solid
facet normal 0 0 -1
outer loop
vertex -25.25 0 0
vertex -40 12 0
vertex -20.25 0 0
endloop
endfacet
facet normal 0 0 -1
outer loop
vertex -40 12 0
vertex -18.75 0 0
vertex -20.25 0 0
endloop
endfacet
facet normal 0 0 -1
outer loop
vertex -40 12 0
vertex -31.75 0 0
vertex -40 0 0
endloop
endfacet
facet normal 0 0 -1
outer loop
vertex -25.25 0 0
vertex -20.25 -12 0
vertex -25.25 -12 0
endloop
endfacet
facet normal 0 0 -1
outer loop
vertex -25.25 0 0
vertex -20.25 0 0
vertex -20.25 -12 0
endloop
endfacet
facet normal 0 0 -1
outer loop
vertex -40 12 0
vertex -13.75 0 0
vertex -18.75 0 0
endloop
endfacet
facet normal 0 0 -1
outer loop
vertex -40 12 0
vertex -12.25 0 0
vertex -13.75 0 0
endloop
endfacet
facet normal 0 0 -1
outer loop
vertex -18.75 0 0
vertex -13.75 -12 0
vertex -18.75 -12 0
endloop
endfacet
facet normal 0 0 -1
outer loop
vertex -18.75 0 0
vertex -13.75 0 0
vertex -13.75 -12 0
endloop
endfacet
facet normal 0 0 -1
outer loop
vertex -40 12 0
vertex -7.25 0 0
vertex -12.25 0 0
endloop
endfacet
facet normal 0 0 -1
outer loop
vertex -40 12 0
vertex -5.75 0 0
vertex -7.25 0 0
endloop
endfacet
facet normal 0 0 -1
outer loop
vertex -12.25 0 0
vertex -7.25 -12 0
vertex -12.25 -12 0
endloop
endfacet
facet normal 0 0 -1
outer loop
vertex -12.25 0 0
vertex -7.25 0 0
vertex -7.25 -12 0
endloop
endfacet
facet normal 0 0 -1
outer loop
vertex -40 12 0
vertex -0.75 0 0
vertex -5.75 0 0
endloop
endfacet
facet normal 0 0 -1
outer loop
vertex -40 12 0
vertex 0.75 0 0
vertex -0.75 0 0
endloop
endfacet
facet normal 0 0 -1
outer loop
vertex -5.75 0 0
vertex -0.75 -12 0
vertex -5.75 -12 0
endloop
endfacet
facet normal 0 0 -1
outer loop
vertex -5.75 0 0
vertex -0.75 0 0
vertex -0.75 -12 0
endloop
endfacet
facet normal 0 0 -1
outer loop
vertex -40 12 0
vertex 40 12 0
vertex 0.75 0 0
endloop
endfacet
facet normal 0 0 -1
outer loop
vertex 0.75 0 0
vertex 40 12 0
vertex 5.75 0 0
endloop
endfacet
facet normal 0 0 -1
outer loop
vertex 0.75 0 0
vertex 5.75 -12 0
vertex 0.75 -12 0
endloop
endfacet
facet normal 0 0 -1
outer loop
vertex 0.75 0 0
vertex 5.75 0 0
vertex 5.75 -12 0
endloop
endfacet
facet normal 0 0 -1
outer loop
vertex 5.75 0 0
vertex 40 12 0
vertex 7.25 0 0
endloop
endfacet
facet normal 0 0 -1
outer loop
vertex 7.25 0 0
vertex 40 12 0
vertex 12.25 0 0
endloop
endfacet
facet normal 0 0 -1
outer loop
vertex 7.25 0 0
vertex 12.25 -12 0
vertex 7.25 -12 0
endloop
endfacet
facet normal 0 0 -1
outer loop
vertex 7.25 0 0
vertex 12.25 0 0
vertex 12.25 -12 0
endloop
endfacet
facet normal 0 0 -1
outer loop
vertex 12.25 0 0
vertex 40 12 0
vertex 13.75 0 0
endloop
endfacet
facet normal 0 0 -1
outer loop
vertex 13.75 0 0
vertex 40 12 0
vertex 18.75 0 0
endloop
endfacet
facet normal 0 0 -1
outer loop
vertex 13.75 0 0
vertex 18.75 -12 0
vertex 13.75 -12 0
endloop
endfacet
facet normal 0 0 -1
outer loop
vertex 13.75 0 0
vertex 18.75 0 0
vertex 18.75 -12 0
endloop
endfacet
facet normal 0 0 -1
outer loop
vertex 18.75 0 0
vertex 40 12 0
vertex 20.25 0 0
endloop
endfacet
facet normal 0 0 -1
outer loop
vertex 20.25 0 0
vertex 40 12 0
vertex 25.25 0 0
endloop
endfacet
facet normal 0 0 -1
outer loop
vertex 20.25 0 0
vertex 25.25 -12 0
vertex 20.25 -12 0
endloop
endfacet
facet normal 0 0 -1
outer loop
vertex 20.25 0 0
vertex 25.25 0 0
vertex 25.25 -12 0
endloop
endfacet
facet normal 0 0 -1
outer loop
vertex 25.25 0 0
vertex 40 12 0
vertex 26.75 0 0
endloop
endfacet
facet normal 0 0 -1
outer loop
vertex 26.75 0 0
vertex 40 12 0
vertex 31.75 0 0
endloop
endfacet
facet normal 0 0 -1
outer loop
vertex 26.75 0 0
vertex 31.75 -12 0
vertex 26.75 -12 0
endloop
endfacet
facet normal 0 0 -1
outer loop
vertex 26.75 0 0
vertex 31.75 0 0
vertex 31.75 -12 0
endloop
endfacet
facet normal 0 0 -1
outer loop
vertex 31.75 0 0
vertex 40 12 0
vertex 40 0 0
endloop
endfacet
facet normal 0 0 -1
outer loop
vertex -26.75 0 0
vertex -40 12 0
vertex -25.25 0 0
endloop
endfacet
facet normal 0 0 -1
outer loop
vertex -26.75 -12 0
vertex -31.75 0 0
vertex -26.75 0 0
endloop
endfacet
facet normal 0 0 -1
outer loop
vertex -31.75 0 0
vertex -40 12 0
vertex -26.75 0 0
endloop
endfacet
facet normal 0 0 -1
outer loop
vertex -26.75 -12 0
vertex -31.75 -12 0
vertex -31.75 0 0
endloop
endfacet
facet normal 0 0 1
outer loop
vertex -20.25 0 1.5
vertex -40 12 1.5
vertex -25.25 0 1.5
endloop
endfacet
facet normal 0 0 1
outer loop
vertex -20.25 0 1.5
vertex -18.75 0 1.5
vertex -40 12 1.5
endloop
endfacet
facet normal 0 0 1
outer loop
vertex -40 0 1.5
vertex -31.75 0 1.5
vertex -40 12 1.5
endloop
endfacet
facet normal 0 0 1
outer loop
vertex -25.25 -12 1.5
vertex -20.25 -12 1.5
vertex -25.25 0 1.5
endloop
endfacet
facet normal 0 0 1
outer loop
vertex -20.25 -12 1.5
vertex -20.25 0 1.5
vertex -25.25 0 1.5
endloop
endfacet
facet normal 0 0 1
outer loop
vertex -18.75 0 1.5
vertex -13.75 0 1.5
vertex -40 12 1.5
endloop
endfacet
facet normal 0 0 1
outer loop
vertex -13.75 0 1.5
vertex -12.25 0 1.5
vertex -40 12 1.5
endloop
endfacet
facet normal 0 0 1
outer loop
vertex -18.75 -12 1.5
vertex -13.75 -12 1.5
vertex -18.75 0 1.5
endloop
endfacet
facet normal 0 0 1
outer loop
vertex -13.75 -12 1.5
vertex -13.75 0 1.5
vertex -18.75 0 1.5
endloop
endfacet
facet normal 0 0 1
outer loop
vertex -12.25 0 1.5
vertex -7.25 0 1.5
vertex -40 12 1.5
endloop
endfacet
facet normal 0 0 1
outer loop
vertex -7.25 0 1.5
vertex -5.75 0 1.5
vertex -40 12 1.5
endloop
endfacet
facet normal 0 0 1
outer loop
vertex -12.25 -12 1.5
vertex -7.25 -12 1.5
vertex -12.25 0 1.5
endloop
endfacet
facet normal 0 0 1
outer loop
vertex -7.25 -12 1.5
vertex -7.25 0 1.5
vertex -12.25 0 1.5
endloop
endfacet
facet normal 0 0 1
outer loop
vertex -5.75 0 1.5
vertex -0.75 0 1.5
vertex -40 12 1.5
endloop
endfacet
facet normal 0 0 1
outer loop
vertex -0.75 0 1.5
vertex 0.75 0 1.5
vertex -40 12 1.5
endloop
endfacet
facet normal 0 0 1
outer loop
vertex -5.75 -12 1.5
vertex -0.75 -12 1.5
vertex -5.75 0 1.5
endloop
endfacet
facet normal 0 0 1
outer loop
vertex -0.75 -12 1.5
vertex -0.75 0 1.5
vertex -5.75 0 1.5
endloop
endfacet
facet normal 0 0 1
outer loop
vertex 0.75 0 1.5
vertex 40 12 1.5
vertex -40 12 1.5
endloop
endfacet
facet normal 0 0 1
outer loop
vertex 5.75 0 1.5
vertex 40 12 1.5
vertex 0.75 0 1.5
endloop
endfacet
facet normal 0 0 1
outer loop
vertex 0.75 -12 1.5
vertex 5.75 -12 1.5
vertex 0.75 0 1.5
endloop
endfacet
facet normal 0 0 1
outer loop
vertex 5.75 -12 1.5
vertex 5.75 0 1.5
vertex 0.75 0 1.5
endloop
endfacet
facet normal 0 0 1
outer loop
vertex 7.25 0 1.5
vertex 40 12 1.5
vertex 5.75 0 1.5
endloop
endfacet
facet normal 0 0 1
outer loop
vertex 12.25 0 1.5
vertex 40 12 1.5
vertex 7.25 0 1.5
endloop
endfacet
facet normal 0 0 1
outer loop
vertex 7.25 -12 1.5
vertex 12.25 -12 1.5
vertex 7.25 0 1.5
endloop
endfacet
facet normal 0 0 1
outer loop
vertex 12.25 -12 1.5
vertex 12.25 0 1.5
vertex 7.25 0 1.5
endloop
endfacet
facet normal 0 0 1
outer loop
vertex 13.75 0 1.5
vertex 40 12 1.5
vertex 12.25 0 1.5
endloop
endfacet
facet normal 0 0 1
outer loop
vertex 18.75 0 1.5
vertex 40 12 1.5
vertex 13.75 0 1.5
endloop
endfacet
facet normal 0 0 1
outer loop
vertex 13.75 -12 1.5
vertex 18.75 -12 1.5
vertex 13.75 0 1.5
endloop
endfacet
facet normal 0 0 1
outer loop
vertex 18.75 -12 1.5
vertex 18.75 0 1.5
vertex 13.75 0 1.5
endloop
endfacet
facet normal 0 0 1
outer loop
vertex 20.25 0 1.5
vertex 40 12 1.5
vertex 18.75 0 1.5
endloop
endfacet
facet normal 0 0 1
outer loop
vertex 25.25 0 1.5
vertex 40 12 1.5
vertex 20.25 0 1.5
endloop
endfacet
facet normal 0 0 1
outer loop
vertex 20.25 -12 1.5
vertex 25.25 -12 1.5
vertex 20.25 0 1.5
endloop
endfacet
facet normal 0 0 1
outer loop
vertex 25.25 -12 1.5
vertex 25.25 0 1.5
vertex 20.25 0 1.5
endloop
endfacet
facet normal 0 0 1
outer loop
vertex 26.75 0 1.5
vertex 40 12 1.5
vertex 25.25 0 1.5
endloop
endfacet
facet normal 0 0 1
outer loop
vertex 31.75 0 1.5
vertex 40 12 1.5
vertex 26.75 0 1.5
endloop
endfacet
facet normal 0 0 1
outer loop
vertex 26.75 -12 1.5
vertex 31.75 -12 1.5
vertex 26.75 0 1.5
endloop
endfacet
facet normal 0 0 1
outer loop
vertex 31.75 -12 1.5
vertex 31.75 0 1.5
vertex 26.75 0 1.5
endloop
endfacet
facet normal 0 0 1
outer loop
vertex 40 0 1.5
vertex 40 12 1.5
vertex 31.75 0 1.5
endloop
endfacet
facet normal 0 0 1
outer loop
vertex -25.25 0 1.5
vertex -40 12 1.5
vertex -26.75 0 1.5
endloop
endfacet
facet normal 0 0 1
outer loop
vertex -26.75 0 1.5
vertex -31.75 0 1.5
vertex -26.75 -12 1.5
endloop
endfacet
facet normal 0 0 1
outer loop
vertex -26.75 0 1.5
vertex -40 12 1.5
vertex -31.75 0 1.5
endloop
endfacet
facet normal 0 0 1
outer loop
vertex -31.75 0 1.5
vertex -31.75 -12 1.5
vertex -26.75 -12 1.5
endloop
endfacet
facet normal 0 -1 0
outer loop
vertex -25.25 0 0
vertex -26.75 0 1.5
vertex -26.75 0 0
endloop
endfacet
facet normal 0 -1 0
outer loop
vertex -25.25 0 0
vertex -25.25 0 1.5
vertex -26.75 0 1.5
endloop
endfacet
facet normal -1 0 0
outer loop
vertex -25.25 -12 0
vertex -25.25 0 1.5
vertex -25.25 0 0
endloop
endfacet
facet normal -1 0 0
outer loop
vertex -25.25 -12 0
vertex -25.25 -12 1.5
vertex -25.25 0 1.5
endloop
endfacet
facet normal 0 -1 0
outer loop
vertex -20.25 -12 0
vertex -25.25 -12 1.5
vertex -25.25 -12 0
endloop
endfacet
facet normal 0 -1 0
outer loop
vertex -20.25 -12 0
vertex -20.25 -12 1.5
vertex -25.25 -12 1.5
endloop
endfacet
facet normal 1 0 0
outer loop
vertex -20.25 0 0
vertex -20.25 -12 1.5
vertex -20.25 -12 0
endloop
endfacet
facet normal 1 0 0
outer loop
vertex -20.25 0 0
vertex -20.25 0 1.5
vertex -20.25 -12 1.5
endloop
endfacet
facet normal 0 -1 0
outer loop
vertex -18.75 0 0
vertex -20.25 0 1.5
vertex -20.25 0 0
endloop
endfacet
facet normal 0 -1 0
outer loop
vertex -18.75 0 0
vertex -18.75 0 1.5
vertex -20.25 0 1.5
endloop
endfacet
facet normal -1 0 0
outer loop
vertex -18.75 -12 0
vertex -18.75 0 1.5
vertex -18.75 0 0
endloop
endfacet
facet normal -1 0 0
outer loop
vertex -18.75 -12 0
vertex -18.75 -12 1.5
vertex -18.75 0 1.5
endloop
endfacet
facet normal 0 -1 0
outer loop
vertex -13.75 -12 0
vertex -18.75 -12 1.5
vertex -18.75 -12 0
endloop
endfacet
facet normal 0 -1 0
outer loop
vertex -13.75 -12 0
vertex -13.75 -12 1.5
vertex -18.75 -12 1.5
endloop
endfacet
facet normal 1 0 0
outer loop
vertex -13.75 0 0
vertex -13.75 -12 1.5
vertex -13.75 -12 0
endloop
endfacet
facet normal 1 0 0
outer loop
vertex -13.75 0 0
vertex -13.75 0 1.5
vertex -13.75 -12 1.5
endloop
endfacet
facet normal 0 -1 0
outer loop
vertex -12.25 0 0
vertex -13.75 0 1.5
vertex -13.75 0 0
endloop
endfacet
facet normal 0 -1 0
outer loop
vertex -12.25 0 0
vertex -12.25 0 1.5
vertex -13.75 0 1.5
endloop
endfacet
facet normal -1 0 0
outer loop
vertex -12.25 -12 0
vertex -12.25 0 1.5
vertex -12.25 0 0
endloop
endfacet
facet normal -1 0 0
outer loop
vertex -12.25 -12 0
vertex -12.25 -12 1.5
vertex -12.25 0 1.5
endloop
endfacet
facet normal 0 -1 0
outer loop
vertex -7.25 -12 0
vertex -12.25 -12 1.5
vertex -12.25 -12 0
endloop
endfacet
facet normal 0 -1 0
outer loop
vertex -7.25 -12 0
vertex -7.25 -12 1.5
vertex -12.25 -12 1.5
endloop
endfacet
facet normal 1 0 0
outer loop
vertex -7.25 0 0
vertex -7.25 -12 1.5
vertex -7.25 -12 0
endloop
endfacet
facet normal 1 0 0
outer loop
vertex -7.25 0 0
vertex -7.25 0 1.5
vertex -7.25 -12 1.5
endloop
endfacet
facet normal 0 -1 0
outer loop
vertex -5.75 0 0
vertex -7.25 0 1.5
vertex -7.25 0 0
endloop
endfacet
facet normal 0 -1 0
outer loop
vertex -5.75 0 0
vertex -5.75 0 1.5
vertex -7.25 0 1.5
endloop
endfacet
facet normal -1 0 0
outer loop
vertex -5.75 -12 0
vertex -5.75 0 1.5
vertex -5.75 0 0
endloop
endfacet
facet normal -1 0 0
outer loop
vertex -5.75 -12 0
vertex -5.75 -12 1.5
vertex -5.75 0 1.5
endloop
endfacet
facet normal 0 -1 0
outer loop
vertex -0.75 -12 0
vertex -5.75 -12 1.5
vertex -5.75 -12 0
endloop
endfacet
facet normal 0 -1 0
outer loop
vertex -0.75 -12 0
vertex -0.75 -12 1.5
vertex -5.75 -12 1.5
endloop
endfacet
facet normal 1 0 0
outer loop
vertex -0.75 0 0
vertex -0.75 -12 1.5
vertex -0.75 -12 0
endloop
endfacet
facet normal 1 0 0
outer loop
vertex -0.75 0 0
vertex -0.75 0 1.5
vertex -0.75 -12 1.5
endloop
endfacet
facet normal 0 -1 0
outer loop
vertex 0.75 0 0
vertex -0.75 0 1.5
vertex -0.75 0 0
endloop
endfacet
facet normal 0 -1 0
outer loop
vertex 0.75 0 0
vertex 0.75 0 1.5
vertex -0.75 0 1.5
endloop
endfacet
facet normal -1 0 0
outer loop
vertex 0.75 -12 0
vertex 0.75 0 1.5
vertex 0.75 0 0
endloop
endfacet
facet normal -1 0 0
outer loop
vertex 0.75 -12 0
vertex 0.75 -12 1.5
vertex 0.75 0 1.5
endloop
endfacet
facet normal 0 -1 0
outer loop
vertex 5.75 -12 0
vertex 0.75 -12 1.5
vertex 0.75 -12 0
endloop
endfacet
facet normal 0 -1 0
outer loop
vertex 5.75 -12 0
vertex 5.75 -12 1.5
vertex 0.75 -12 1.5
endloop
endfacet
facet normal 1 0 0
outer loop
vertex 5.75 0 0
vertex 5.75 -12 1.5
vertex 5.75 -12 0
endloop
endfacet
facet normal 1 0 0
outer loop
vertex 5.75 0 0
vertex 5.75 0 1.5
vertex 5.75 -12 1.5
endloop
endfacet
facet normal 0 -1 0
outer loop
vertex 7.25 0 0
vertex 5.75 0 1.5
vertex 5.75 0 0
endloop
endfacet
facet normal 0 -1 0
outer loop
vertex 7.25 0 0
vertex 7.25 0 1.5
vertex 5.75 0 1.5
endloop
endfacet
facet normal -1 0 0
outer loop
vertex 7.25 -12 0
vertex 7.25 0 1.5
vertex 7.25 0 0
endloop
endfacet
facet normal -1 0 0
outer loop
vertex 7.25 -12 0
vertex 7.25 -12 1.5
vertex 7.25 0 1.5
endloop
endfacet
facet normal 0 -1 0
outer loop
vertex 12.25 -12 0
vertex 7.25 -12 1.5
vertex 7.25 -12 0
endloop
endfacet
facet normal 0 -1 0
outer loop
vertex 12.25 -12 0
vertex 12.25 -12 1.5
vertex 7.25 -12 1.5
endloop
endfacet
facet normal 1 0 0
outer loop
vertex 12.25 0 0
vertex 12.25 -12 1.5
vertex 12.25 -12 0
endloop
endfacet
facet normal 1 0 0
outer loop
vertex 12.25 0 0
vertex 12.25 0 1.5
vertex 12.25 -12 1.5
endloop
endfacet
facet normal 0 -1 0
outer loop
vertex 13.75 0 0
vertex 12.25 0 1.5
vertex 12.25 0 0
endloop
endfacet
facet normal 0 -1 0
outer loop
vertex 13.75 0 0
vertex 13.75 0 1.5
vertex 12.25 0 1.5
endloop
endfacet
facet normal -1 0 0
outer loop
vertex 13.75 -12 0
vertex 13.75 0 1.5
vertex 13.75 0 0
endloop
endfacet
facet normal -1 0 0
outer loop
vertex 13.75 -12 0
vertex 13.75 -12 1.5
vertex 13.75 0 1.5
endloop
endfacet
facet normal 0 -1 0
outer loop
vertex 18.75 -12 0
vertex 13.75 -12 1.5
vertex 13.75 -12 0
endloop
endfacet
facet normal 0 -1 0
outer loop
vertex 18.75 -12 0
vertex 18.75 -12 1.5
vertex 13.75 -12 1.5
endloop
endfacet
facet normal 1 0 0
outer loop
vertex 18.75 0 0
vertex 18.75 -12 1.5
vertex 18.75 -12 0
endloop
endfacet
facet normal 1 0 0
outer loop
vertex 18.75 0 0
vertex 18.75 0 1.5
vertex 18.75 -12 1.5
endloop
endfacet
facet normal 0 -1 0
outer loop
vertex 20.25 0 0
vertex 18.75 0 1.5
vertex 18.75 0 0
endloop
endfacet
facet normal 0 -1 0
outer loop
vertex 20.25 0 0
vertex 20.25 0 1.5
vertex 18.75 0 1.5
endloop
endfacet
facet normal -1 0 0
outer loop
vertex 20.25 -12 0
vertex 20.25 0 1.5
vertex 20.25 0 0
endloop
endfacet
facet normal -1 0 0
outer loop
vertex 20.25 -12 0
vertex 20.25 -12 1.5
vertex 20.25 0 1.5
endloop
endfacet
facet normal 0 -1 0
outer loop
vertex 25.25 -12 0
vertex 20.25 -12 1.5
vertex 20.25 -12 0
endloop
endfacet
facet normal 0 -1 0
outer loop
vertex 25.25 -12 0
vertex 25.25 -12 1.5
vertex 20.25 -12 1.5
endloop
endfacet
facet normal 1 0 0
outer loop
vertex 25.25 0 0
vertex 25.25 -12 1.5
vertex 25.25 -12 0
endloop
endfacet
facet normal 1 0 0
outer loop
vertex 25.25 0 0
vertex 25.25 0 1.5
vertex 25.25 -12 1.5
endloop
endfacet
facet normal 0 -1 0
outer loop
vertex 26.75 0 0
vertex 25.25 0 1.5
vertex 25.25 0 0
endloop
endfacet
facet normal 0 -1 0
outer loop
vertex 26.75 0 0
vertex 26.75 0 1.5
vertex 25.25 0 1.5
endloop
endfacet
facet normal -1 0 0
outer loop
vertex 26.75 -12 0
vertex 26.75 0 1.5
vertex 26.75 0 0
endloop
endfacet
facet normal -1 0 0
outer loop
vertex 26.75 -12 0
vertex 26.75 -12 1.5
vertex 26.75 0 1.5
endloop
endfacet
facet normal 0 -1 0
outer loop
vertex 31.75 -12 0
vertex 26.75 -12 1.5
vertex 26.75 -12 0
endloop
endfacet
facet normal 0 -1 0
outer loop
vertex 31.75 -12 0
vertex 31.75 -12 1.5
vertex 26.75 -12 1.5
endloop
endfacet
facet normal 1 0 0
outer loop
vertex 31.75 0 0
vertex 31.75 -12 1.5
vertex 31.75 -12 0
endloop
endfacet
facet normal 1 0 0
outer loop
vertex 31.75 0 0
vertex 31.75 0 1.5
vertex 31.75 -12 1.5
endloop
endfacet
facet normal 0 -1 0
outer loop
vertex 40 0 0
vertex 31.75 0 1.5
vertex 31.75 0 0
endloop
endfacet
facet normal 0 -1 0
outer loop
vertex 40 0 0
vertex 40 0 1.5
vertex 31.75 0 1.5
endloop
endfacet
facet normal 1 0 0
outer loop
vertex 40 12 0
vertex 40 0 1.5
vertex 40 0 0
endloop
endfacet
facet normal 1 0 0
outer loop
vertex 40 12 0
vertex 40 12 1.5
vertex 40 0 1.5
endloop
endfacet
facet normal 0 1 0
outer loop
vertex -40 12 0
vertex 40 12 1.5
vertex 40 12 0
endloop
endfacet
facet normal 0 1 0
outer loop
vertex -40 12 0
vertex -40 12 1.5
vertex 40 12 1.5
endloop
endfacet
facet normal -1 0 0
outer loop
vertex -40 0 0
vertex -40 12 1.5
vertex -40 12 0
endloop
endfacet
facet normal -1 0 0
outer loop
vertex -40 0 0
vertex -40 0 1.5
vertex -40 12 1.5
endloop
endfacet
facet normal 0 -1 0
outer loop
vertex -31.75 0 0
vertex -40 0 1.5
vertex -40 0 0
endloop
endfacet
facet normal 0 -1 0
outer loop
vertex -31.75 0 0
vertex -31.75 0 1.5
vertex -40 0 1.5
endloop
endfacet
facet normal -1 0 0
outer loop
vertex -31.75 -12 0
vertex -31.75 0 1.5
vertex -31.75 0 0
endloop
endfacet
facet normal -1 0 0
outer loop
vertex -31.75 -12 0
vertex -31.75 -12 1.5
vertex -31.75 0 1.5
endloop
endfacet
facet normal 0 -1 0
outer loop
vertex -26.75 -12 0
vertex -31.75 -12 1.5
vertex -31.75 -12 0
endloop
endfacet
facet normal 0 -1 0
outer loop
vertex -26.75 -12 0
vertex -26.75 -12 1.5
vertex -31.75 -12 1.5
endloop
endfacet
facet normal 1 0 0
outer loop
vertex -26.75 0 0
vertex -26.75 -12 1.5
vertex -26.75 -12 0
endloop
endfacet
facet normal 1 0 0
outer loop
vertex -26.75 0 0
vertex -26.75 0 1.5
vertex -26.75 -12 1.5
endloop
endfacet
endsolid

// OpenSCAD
// 10-well comb for casting agarose gels
// Category: tools. Flat part, prints lying down. The spine is longer than the row of
// teeth so its ends rest on the tray walls (or comb slots); set tooth_len so the tooth
// tips sit 1-2 mm above the tray floor, otherwise wells cast through the gel and
// samples leak out underneath.
// Print: PETG (survives warm agarose better than PLA), 0.15 mm layers, 100 % infill.
// The bed side is smoothest on a smooth PEI sheet - use that side for the well faces.
// Use: let agarose cool to 50-60 C (hand-warm flask) before pouring; hotter agarose
// warps PETG and PLA combs and trays.
// SPDX-License-Identifier: CERN-OHL-P-2.0

/* [Comb] */
// back bar, X x Y [mm]; ends rest on the tray walls
spine = [80, 12];
n_teeth = 10;
// well width
tooth_w = 5.0; // 0.1
// = (height of spine support above tray floor) - 1.5 mm
tooth_len = 12;
// gel between wells
gap = 1.5; // 0.1
// well thickness (comb printed flat)
thickness = 1.5; // 0.1

/* [Hidden] */
eps = 0.01;
span = n_teeth * tooth_w + (n_teeth - 1) * gap;

// parameter checks: stop with a message instead of building a broken part
assert(n_teeth >= 1, "n_teeth must be at least 1");
assert(span <= spine[0], "the teeth are wider than the spine: lengthen the spine or narrow the teeth/gaps");

linear_extrude(thickness) {
    translate([-spine.x / 2, 0]) square(spine);
    for (i = [0 : n_teeth - 1])
        translate([-span / 2 + i * (tooth_w + gap), -tooth_len])
            square([tooth_w, tooth_len + eps]);
}
